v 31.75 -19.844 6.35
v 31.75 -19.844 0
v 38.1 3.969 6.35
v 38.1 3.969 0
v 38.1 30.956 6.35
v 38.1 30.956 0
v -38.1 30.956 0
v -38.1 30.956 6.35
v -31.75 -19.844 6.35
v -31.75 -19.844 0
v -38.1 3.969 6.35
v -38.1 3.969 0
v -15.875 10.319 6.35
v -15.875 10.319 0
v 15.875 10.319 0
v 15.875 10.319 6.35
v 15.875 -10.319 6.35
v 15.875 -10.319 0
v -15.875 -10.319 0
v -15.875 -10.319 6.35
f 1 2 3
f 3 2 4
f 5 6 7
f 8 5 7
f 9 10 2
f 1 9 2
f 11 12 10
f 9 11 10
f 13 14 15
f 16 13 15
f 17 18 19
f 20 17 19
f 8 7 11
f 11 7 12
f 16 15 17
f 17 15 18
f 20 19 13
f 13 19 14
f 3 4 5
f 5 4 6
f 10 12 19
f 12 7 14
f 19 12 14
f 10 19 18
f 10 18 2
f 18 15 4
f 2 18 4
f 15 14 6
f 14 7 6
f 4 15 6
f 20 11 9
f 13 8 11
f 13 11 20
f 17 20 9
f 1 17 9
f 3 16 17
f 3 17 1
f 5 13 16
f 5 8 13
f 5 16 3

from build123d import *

# Parameters (mm, degrees)
F1_DEPTH = 6.35


with BuildPart() as f1:
    # F0 (on Top) → F1 (new body)
    with BuildSketch(Plane.XY):
        Polygon((38.1, 3.96875), (38.1, 30.95625), (0, 30.95625), (-38.1, 30.95625), (-38.1, 3.96875), (-31.75, -19.84375), (0, -19.84375), (31.75, -19.84375), align=None)
        Polygon((-15.875, 10.31875), (0, 10.31875), (15.875, 10.31875), (15.875, -10.31875), (0, -10.31875), (-15.875, -10.31875), align=None, mode=Mode.SUBTRACT)
    extrude(amount=F1_DEPTH)


solid = f1.part
